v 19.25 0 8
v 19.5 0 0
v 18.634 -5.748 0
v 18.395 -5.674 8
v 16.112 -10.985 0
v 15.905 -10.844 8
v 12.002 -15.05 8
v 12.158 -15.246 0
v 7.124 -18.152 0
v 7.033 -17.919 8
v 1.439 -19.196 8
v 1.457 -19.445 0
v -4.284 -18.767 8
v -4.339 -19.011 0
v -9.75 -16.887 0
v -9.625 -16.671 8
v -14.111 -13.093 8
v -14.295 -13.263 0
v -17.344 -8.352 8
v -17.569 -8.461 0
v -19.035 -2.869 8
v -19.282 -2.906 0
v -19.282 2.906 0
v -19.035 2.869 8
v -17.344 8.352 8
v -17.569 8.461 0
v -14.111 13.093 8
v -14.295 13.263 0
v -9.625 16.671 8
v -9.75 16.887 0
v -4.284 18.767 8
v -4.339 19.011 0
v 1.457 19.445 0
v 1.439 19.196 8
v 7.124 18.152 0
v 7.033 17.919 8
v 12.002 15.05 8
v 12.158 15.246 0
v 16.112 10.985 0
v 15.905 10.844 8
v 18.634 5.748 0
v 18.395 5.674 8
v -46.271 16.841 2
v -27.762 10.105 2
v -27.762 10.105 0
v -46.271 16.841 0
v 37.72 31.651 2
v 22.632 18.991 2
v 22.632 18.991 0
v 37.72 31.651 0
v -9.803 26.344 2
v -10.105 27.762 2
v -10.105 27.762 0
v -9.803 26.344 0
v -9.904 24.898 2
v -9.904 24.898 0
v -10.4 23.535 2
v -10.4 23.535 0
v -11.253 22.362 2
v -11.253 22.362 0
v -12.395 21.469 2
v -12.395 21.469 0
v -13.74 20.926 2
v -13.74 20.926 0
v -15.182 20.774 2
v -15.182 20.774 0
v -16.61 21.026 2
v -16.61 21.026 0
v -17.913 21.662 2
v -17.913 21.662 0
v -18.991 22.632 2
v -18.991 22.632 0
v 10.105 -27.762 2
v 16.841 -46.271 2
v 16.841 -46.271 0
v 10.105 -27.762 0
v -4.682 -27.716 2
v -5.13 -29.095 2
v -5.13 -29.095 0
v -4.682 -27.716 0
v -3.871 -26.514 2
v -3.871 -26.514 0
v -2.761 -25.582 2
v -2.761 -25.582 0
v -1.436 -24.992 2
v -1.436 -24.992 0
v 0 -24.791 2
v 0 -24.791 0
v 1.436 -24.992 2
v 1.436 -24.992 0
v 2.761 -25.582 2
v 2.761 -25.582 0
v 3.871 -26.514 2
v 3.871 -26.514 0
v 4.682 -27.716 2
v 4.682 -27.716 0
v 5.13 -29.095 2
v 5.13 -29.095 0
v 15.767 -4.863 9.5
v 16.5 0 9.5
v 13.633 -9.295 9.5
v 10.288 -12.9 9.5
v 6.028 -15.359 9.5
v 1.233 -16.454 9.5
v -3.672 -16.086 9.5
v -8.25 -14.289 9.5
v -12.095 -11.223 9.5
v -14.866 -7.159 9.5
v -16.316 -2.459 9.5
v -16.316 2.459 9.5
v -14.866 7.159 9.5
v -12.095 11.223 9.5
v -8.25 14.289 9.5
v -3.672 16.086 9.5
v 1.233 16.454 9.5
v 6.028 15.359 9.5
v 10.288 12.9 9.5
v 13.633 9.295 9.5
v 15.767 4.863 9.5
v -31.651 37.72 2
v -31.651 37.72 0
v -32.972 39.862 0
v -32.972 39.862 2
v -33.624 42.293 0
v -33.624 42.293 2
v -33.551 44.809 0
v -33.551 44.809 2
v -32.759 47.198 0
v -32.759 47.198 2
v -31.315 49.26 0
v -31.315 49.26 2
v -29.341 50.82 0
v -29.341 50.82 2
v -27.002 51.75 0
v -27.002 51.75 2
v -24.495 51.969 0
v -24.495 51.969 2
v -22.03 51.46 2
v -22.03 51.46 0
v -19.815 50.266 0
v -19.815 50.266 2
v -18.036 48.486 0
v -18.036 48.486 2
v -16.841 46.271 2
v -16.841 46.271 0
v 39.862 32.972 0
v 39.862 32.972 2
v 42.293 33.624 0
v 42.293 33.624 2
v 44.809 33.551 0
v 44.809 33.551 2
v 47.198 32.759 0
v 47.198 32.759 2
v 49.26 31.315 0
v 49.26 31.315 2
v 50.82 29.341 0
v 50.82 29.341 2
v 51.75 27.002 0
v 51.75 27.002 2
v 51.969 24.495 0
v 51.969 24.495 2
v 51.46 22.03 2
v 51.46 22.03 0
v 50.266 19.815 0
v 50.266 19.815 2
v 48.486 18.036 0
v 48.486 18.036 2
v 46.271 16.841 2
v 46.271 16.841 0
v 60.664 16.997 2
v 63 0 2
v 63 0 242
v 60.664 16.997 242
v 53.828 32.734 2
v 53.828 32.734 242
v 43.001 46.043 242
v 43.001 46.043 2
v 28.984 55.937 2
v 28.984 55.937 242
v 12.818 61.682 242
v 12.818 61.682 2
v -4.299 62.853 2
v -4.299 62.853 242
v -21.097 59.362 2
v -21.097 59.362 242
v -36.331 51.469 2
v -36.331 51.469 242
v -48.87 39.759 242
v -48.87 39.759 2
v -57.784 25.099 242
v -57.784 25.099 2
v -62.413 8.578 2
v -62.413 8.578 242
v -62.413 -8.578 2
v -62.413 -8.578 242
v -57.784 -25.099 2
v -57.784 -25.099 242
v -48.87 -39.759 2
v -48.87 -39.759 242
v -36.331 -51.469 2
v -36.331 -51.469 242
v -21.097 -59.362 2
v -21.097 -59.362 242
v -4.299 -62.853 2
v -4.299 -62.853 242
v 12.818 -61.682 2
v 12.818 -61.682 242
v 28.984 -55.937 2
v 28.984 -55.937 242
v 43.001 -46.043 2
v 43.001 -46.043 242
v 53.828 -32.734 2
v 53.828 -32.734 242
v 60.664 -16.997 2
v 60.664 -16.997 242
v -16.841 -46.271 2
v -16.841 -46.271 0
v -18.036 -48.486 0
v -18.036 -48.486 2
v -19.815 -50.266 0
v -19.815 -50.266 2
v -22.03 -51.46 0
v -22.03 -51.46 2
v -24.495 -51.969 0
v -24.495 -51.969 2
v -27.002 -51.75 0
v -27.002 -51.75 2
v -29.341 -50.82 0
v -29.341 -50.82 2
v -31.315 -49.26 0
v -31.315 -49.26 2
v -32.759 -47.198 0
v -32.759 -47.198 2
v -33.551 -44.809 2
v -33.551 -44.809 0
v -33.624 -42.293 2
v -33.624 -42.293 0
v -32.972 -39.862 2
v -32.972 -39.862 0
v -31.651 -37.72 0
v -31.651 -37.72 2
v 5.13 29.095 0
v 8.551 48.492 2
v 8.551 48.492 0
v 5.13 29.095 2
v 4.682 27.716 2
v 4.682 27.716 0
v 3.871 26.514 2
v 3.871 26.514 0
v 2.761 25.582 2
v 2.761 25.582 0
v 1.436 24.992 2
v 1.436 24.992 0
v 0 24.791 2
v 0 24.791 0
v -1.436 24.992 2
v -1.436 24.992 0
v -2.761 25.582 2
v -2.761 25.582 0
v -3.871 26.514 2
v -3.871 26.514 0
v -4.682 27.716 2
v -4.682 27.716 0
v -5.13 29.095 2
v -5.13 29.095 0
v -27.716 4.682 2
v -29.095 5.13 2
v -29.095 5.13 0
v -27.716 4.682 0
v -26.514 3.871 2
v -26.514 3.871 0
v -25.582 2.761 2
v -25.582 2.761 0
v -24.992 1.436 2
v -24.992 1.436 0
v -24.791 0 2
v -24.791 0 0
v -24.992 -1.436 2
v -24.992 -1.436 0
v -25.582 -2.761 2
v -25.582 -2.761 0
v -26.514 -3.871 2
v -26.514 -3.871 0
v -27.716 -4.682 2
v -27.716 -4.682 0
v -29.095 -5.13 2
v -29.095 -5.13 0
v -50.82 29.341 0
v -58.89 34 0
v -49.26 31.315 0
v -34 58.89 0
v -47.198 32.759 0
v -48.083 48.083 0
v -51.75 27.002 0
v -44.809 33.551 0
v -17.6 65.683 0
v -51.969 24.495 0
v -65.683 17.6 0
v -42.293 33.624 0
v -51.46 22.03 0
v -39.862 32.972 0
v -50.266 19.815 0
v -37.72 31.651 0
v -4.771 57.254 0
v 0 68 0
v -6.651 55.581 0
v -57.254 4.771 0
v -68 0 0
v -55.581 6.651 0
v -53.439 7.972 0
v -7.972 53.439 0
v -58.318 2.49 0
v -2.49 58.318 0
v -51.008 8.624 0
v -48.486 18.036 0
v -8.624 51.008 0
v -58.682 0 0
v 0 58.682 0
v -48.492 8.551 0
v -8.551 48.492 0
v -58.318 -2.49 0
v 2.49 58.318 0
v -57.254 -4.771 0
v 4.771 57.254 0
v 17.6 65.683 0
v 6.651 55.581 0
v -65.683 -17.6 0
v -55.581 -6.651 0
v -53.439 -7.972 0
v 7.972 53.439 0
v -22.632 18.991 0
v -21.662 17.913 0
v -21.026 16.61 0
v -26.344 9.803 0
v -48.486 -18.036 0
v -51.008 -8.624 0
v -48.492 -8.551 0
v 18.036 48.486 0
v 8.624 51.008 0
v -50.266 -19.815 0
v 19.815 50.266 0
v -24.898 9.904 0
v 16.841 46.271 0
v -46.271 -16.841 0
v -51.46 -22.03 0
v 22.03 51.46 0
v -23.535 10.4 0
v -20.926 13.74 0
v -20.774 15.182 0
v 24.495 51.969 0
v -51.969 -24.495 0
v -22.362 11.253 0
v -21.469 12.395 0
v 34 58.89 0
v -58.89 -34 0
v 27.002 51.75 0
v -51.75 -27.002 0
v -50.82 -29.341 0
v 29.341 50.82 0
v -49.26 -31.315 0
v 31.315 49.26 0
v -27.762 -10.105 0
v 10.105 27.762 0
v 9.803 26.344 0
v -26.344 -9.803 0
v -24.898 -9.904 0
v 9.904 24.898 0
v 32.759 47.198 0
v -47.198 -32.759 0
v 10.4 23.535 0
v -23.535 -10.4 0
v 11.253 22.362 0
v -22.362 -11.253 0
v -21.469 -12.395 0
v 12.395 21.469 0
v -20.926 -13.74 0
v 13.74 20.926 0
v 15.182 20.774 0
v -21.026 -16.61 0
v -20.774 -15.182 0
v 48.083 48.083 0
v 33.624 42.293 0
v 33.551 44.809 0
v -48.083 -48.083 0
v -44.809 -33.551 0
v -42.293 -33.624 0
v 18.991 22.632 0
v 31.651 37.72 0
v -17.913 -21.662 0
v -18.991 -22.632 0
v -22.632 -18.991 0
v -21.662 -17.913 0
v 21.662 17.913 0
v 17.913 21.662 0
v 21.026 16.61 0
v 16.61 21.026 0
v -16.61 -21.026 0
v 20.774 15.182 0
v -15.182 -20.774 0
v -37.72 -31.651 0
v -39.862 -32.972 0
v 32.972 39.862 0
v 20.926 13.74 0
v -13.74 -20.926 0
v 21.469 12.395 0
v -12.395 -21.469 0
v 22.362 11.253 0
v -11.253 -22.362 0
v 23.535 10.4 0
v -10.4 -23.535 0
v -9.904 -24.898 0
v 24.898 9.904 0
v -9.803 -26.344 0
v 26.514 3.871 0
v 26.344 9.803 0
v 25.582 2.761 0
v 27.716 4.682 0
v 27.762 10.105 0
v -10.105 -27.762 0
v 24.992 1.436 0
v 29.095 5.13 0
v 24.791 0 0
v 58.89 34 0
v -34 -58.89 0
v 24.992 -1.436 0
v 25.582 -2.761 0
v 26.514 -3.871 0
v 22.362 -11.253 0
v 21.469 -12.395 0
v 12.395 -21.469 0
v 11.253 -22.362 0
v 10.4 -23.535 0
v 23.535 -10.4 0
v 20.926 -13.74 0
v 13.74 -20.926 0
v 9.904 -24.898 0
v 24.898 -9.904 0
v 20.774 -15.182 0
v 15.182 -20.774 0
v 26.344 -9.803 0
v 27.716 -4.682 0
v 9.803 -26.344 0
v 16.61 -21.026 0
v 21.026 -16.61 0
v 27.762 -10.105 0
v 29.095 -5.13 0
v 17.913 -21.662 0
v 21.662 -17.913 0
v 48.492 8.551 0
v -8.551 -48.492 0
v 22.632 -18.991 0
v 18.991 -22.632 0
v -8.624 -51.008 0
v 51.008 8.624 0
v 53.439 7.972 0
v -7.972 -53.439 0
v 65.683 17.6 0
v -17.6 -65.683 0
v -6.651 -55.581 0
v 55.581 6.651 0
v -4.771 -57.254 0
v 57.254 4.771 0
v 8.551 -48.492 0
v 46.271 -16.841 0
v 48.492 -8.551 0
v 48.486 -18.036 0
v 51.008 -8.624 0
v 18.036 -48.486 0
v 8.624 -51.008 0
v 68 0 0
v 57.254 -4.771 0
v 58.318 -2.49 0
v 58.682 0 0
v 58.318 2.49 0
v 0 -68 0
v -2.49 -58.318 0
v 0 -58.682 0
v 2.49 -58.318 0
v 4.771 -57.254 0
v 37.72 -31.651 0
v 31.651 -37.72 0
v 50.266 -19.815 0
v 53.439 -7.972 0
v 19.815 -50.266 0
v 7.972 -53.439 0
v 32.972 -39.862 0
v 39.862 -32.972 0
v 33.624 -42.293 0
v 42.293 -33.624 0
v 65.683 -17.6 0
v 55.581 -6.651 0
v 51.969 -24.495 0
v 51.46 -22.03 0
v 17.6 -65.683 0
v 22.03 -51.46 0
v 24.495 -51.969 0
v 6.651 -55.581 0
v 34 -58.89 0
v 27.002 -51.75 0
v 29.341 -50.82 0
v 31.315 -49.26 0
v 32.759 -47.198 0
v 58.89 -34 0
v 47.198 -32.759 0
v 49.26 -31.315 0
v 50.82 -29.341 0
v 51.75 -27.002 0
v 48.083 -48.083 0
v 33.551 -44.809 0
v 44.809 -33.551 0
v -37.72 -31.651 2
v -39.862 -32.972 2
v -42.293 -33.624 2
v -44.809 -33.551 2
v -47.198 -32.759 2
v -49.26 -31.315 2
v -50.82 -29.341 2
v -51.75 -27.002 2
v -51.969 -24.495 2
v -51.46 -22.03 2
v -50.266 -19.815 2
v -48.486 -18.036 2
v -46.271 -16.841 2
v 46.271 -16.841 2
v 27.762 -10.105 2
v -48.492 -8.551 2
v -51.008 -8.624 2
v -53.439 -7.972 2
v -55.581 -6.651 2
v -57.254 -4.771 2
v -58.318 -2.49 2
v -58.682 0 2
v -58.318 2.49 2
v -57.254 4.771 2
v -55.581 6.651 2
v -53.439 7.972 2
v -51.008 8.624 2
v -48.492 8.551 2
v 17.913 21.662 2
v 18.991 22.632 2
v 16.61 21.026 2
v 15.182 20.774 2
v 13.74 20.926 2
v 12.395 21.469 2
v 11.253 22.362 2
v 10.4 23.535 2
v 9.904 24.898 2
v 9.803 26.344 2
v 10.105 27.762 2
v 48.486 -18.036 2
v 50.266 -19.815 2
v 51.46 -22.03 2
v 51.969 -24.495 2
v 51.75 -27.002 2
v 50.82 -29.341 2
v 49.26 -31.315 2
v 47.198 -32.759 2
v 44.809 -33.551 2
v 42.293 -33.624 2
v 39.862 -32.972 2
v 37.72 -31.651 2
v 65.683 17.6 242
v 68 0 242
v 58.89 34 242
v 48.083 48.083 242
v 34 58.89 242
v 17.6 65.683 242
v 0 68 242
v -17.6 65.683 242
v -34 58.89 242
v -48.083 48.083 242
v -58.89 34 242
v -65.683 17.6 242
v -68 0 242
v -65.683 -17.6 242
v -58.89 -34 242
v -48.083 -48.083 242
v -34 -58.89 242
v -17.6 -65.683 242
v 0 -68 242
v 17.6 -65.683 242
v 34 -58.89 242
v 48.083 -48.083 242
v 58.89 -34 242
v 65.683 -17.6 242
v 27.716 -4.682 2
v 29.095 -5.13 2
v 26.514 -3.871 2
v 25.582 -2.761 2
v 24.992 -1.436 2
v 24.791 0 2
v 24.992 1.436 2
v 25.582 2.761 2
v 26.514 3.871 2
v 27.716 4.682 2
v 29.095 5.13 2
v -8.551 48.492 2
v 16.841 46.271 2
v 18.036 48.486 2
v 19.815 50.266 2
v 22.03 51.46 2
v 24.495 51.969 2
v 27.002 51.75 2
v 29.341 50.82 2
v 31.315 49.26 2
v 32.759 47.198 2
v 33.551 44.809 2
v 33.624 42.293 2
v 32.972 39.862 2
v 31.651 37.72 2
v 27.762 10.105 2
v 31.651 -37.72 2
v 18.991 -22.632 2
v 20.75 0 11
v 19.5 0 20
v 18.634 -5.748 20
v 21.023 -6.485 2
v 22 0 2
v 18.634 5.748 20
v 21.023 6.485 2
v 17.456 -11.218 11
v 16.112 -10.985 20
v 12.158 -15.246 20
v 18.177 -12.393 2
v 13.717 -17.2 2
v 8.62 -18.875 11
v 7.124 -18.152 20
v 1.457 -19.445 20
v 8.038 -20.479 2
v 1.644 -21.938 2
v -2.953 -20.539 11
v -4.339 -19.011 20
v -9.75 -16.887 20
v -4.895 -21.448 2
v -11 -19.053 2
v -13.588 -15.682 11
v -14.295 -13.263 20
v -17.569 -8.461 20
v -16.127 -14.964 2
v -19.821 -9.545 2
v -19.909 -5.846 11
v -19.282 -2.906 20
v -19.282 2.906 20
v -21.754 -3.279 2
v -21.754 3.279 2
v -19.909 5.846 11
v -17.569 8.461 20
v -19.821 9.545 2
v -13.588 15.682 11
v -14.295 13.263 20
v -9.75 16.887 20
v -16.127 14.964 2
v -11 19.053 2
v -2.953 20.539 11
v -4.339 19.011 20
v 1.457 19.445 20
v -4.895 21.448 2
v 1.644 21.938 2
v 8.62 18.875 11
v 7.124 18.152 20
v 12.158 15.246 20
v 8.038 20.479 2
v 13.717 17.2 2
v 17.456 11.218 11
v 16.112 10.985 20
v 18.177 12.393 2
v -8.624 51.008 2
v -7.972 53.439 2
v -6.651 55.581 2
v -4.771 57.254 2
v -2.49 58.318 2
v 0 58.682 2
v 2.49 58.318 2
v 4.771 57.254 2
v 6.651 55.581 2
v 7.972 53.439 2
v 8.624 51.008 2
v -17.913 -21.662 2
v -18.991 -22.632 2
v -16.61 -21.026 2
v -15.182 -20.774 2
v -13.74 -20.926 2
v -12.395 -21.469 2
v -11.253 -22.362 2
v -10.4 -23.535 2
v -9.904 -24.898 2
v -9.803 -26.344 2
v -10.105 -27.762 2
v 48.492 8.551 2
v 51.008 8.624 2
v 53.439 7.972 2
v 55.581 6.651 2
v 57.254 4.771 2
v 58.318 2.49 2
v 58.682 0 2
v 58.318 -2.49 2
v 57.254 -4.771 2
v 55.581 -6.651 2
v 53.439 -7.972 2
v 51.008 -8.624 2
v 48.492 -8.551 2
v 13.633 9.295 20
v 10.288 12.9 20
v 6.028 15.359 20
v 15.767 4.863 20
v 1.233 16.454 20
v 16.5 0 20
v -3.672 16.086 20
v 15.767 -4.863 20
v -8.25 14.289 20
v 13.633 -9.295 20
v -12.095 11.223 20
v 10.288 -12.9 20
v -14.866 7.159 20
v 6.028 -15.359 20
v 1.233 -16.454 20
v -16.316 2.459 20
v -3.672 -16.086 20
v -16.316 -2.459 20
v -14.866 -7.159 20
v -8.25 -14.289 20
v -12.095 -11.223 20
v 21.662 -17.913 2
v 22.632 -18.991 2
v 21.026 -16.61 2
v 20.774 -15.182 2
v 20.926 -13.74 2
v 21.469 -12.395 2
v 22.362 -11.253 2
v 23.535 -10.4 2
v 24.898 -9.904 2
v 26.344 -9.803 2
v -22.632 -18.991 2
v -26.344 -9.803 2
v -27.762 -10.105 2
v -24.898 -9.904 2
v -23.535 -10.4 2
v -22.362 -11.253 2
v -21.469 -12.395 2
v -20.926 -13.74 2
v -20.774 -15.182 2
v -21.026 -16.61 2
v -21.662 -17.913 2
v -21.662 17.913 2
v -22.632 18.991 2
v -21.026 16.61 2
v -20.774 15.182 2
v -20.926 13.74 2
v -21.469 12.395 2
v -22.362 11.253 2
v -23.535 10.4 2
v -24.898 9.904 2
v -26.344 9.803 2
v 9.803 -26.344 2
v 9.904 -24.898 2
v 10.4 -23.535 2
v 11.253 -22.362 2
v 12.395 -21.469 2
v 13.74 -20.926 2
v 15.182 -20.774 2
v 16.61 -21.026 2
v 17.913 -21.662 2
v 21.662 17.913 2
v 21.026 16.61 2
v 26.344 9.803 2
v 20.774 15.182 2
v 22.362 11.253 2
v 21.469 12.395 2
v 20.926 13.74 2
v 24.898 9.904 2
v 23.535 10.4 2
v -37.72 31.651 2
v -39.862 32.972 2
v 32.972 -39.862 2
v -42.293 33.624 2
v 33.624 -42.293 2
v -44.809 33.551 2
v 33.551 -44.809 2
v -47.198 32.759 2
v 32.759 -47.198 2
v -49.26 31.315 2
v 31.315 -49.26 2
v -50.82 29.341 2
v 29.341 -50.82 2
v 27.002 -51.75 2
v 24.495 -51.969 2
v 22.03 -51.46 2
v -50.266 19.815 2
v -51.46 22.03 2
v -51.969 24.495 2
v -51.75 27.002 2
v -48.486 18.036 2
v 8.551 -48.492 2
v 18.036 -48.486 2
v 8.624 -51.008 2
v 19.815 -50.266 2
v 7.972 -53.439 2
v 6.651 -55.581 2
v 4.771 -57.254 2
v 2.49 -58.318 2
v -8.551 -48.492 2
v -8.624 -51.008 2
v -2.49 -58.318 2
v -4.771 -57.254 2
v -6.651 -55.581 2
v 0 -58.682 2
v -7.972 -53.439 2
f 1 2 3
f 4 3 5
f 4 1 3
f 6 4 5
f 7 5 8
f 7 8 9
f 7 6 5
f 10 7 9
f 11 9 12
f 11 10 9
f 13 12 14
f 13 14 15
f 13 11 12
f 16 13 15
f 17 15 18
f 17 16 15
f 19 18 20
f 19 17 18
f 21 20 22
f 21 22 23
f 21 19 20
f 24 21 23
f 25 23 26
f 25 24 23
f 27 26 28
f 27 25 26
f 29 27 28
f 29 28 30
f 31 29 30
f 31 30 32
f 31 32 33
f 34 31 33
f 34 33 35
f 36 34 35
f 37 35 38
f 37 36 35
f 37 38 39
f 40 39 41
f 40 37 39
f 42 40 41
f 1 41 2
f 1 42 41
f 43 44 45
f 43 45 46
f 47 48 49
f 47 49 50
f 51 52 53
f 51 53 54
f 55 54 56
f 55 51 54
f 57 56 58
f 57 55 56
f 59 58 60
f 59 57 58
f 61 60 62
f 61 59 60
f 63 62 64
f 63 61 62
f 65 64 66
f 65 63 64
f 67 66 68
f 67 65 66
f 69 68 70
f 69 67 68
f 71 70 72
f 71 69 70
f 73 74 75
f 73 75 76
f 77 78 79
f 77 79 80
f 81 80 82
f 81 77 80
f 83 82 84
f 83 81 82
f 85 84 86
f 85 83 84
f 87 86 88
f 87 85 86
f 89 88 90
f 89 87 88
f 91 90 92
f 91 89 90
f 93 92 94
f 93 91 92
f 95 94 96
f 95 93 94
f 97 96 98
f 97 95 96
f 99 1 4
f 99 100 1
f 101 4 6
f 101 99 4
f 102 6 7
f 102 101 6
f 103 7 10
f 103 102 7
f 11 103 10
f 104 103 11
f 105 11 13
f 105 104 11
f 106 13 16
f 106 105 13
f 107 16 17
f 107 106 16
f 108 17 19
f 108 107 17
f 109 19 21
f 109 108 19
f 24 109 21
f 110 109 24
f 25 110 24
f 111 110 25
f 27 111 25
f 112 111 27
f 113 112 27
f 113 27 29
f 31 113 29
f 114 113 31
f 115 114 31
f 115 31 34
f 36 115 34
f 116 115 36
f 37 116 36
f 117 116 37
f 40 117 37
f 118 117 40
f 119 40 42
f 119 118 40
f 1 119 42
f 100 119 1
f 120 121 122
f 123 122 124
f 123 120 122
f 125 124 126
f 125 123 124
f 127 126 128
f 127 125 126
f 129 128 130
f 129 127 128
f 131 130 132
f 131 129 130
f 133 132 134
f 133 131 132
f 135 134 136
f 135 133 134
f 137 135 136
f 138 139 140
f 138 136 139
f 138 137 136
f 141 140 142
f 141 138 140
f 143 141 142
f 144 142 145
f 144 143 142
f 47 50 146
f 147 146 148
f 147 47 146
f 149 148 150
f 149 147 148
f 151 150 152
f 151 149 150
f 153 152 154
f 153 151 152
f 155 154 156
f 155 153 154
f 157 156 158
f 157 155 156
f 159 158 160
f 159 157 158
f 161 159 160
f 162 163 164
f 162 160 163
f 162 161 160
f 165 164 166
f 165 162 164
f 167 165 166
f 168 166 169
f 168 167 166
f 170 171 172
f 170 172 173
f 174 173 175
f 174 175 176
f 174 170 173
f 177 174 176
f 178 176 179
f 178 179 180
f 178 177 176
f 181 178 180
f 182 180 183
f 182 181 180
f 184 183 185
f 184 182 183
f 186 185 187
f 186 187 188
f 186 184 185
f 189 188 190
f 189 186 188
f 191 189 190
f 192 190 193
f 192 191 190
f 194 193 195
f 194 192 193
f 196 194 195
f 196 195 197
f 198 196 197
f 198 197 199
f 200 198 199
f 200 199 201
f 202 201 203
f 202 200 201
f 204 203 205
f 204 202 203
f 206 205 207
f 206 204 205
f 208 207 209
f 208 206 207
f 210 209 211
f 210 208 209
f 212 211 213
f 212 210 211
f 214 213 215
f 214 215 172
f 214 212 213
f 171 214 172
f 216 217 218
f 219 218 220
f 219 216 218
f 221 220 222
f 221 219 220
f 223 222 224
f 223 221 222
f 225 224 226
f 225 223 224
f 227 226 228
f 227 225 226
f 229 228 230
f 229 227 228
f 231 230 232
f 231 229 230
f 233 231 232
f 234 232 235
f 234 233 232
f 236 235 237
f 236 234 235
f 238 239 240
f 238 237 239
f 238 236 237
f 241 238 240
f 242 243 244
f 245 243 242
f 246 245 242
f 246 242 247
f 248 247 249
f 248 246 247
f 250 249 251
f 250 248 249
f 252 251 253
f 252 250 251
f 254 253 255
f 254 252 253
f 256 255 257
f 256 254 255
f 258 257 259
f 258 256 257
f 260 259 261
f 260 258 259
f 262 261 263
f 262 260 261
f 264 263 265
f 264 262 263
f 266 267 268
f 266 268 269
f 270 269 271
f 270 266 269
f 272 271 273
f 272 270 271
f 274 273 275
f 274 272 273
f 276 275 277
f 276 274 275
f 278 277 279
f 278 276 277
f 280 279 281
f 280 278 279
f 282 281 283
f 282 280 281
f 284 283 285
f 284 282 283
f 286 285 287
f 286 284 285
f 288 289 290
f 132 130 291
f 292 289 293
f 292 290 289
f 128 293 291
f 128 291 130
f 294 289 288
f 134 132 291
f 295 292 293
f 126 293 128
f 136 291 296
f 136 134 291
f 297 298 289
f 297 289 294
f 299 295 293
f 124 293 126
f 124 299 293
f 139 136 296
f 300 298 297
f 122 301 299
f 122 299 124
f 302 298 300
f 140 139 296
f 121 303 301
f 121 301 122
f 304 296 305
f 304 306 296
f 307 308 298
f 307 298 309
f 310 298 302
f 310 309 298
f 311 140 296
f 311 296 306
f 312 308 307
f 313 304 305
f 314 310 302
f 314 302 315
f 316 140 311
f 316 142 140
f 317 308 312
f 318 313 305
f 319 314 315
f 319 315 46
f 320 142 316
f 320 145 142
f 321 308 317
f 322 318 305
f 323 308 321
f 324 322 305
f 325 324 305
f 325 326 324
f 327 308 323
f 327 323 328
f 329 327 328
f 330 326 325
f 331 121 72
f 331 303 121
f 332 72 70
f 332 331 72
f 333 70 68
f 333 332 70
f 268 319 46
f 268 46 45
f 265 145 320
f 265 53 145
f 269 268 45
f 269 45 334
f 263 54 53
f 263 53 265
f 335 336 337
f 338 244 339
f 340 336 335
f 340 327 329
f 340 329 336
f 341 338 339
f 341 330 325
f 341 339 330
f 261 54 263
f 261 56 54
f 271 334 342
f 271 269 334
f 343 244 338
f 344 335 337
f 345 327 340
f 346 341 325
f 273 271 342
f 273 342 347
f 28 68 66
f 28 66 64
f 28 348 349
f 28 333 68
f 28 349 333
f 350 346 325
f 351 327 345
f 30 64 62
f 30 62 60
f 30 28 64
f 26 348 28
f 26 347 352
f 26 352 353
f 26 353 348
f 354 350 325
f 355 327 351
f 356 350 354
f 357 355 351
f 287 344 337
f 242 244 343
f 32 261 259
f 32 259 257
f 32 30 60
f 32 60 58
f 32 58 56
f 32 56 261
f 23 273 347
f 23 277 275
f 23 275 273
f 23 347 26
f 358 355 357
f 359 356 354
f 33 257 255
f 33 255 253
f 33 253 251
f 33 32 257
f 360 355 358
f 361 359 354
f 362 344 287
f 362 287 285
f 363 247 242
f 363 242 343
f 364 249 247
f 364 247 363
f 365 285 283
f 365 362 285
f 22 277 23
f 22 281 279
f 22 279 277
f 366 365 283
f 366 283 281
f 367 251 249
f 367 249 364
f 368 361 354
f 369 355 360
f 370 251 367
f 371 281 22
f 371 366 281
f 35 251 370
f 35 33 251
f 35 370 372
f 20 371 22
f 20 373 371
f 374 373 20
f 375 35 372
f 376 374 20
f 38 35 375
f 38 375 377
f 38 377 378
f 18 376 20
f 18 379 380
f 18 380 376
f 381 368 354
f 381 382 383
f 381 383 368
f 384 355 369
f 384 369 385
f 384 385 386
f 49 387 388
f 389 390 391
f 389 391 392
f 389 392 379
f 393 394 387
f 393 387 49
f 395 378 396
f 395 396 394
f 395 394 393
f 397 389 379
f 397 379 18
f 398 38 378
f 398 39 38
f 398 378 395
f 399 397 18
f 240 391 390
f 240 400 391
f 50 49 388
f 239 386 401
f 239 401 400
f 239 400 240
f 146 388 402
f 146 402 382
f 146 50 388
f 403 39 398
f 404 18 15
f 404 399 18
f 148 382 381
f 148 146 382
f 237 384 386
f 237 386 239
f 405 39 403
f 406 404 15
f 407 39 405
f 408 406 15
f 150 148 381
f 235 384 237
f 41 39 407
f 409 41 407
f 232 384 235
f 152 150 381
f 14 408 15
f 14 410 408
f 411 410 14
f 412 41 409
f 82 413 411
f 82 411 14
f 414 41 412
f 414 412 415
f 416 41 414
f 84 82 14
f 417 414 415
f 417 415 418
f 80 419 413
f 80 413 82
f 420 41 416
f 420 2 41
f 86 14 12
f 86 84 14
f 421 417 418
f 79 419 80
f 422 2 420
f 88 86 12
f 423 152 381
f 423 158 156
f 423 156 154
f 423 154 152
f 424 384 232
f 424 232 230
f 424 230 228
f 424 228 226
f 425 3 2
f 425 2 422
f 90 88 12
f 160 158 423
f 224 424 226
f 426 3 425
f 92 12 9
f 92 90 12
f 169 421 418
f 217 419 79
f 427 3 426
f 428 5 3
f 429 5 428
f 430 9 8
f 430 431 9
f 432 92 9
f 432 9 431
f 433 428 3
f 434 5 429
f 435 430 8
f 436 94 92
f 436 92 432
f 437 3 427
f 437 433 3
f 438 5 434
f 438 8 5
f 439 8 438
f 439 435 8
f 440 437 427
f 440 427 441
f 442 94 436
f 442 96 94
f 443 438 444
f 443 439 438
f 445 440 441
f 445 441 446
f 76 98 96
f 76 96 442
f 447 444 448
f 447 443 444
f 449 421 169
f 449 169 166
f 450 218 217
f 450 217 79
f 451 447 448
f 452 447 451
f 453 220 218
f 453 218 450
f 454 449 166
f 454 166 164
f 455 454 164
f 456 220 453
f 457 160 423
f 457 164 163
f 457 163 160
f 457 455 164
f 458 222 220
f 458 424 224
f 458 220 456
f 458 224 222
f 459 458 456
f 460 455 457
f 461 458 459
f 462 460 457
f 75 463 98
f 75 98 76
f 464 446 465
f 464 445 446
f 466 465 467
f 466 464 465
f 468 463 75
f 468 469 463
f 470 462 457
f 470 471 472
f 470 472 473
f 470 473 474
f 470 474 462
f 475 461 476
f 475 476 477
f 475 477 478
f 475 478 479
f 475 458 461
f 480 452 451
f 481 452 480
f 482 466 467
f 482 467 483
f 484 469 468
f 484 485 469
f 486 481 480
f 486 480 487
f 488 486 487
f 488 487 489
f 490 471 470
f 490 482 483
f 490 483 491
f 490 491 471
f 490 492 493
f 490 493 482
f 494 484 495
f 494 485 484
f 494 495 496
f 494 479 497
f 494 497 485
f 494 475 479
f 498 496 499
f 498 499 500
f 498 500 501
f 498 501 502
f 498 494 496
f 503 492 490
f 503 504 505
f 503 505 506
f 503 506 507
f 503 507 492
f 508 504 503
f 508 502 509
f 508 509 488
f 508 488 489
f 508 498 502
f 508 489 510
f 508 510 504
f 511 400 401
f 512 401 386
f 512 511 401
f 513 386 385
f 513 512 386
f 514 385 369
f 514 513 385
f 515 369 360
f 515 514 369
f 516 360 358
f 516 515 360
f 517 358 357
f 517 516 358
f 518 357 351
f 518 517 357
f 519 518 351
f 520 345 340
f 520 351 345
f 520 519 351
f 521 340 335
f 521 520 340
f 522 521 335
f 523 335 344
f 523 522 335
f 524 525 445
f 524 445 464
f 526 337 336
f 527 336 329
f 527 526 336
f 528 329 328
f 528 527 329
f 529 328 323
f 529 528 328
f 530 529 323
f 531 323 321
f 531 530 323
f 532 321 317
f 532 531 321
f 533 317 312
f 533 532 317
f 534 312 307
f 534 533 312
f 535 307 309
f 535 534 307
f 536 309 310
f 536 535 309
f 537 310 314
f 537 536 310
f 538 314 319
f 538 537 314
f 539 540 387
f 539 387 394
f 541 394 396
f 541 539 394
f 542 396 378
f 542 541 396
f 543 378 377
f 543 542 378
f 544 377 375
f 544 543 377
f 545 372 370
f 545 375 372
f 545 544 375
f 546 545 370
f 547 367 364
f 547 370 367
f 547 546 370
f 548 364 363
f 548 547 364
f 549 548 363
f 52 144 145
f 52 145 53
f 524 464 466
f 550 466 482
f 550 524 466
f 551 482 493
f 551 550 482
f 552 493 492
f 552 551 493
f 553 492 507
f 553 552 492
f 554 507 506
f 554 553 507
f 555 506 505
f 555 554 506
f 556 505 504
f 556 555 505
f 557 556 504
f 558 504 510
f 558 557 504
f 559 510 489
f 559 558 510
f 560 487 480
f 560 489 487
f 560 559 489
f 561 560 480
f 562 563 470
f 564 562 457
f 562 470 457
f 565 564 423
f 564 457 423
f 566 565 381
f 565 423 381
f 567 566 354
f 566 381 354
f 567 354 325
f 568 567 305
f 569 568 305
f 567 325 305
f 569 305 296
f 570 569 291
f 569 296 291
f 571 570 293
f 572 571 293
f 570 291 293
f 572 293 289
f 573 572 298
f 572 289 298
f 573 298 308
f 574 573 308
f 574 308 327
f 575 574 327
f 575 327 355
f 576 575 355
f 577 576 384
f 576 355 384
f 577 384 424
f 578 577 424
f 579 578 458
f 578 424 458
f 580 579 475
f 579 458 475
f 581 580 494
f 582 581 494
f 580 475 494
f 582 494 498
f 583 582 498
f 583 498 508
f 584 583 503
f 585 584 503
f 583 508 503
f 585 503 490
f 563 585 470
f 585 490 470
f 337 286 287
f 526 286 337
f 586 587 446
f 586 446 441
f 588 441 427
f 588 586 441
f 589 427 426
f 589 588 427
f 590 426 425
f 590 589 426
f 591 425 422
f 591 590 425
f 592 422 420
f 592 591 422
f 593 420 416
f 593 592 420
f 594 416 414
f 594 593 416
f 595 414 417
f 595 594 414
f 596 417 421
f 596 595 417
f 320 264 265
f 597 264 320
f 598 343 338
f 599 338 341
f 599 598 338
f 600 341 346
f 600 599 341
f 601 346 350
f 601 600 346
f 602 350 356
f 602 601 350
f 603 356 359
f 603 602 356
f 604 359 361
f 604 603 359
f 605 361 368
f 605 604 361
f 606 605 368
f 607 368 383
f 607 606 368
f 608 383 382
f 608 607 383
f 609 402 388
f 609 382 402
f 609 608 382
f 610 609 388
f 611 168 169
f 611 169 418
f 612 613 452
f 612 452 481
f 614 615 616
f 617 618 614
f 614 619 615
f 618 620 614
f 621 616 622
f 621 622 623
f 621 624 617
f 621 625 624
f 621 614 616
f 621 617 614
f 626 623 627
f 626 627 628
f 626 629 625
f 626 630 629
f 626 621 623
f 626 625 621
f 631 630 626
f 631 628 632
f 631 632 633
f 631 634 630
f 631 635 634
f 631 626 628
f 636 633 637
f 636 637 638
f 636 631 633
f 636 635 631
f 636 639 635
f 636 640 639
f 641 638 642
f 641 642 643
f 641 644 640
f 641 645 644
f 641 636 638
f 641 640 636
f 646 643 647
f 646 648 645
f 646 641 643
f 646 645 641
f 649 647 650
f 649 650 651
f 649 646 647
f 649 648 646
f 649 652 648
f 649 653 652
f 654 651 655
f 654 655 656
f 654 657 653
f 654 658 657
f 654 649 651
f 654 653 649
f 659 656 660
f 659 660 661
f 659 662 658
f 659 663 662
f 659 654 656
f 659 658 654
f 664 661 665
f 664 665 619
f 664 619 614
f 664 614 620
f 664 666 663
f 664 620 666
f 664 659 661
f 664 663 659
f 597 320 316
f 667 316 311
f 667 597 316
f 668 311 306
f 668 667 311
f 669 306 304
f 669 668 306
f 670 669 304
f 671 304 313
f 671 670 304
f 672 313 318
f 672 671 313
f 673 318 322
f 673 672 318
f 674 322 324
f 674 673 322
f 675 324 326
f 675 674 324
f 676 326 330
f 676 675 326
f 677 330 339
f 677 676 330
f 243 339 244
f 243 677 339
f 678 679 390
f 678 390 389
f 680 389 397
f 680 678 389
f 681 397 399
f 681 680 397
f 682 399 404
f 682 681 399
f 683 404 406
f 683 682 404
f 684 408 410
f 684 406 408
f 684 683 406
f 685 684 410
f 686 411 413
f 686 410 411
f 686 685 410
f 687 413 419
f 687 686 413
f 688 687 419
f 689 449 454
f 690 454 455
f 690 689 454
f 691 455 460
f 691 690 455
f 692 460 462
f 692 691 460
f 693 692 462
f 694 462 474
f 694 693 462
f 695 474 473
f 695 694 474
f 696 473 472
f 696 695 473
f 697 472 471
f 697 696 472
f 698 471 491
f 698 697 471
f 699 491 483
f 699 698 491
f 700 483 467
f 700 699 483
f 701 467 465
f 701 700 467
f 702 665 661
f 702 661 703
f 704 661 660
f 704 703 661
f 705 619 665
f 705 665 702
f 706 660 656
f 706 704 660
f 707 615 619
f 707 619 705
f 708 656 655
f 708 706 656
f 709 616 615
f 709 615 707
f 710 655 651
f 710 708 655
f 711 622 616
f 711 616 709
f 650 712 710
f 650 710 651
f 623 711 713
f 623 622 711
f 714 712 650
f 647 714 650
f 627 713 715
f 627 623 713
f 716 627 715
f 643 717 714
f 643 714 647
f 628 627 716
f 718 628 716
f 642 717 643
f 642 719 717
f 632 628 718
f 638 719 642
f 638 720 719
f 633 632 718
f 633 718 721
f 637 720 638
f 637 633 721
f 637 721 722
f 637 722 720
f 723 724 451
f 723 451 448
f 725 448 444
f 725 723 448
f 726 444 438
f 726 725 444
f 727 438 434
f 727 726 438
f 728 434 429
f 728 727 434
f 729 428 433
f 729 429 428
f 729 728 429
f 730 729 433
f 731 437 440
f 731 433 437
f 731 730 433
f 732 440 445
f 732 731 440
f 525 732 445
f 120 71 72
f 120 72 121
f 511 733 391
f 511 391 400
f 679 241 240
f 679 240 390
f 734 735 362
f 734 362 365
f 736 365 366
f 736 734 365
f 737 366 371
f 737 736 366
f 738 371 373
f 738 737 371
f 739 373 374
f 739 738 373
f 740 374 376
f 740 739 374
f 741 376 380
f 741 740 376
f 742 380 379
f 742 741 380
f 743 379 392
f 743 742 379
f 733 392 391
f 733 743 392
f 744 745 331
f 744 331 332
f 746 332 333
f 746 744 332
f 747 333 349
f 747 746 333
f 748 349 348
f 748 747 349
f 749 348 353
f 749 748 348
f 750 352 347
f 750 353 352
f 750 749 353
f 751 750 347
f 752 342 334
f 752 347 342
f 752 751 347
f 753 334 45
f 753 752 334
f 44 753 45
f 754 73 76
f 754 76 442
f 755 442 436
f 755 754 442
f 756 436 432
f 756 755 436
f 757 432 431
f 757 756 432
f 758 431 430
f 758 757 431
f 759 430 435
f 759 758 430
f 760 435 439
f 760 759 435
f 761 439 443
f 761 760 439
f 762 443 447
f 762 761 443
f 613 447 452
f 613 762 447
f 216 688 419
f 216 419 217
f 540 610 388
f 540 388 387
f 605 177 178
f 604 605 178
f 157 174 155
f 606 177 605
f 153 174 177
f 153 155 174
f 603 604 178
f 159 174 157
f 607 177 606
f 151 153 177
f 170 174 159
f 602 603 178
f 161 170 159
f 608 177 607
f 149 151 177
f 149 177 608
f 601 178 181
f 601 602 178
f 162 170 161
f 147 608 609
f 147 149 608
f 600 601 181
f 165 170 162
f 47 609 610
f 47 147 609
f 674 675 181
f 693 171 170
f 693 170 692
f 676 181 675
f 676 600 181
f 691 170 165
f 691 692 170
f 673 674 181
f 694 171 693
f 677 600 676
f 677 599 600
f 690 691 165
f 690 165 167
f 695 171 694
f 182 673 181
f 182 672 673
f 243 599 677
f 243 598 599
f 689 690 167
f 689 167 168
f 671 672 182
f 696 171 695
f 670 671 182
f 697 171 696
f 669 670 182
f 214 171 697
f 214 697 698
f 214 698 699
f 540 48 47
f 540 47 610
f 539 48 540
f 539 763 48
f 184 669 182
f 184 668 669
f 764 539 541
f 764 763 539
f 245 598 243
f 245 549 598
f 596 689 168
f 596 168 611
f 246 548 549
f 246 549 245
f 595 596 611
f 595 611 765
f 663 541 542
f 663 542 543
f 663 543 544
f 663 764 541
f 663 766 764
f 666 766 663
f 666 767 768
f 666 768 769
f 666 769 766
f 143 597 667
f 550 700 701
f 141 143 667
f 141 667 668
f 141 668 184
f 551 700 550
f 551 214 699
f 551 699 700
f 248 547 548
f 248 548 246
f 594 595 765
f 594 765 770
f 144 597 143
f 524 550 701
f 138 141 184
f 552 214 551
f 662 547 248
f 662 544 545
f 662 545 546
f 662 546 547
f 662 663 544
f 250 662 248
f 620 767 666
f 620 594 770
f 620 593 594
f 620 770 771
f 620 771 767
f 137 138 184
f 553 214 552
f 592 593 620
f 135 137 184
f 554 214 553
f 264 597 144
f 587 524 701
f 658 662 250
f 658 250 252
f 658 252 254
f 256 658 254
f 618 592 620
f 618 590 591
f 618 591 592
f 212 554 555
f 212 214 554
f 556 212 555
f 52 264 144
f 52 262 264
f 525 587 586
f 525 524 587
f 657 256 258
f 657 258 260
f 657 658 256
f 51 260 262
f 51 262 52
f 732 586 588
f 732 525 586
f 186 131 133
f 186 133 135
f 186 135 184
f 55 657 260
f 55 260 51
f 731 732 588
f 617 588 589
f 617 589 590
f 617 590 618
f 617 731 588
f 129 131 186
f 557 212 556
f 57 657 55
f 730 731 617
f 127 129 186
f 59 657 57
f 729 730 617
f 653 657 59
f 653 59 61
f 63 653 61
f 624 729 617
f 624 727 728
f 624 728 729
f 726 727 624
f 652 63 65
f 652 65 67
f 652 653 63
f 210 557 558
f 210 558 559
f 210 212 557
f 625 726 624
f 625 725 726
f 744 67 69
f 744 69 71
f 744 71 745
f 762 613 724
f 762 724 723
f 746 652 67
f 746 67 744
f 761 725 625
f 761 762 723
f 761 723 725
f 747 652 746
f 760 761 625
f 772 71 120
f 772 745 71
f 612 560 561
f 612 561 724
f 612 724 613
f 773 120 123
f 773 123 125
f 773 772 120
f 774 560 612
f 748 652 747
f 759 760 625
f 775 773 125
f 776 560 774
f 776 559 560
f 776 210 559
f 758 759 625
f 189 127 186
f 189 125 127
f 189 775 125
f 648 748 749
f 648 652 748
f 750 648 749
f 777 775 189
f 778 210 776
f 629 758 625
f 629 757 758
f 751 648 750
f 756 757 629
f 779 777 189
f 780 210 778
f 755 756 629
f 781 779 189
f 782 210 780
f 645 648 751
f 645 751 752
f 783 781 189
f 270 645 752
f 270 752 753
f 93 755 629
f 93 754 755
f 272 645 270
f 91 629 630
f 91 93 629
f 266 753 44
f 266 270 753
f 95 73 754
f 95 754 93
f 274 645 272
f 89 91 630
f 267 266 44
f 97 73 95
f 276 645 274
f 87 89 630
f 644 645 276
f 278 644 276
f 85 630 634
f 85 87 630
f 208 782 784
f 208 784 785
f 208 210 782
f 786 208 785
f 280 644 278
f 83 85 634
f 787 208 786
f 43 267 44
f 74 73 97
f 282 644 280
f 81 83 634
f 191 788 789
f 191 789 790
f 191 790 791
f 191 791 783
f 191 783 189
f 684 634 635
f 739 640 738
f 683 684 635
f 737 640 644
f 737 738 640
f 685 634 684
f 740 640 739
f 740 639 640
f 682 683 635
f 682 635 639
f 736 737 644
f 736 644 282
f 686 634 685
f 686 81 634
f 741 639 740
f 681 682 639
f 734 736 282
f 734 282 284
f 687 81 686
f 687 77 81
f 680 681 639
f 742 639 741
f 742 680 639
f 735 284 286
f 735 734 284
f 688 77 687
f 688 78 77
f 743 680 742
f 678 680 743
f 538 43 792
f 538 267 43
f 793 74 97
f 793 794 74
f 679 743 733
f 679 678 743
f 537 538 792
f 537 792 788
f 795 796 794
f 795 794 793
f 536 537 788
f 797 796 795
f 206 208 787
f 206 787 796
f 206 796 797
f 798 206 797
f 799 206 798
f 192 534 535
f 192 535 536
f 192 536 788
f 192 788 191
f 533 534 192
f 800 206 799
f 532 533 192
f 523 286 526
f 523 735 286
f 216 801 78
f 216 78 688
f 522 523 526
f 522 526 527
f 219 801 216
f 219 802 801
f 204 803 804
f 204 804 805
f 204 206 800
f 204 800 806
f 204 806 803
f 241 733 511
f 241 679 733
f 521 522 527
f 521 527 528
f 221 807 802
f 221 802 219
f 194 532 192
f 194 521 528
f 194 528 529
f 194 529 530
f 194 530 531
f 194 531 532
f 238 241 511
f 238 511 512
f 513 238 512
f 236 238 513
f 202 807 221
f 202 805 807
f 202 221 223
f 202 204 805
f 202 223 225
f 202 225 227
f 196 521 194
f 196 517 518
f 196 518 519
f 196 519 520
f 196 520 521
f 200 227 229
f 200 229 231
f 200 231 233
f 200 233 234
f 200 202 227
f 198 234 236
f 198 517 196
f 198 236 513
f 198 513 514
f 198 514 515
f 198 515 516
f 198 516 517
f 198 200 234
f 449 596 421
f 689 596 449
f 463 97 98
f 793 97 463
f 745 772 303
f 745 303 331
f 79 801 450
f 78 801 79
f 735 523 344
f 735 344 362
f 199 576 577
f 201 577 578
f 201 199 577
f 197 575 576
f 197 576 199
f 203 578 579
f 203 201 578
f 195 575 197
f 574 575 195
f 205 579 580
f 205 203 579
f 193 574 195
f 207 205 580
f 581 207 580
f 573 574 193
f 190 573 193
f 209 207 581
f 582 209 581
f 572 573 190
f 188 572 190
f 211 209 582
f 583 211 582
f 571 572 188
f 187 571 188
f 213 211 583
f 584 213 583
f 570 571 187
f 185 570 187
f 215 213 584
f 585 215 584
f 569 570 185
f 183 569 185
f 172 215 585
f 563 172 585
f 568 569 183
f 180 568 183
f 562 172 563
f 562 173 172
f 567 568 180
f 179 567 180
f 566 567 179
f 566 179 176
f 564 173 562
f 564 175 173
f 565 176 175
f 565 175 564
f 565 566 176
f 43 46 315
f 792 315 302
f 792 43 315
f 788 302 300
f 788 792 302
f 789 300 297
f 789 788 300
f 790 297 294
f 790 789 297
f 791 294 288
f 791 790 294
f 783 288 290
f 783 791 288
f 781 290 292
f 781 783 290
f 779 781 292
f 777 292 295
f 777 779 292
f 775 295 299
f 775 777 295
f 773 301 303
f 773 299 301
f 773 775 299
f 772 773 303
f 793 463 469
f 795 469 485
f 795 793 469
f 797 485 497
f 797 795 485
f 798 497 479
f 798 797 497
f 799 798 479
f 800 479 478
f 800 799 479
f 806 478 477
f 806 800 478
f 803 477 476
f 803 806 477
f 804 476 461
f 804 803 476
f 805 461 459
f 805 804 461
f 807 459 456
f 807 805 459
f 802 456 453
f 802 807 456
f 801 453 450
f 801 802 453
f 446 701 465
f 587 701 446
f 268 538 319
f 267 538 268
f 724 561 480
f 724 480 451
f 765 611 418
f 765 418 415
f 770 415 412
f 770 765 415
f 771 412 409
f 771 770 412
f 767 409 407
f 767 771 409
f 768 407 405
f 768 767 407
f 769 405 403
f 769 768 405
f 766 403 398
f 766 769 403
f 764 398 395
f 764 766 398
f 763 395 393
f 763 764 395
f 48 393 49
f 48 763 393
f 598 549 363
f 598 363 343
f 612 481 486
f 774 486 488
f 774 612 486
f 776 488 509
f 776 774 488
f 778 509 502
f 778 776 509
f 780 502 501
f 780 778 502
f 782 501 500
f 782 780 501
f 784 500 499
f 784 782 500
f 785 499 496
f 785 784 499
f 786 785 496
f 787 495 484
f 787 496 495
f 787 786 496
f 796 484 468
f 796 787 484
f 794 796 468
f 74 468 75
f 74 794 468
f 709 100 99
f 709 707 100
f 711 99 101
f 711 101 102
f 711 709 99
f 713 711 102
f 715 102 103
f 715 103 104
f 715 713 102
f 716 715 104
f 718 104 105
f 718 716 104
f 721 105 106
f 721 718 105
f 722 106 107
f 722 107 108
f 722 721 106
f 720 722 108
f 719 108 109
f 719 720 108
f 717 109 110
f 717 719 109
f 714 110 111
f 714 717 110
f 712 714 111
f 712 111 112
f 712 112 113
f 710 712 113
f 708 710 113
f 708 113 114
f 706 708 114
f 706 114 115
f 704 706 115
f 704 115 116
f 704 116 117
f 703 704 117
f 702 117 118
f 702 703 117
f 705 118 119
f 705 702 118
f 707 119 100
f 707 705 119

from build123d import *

# Parameters (mm, degrees)
RING_1MM_R          = 68
RING_1MM_R_2        = 63
BOSS_EXTRUDE1_DEPTH = 240
CUT_EXTRUDE2_DEPTH  = 240


with BuildPart() as part:
    # Sketch1 → Revolve1 (revolve)
    with BuildSketch(Plane(origin=(0, 0, 0), x_dir=(-1, 0, 0), z_dir=(0, 1, 0)), mode=Mode.PRIVATE) as revolve1_sk:
        Polygon((19.5, 0), (19.25, 8), (16.5, 9.5), (16.5, 20), (19.5, 20), (22, 2), (68, 2), (68, 0), align=None)
    revolve(revolve1_sk.sketch.rotate(Axis((0, 0, 20), (0, 0, -1)), 180), axis=Axis((0, 0, 20), (0, 0, -1)))

    # ring-1mm → Boss-Extrude1 (add)
    with BuildSketch(Plane.XY.offset(2)):
        Circle(RING_1MM_R)
        Circle(RING_1MM_R_2, mode=Mode.SUBTRACT)
    extrude(amount=BOSS_EXTRUDE1_DEPTH)

    # Sketch3-base-openings → Cut-Extrude2 (cut)
    with BuildSketch(Plane.XY.offset(2)):
        with BuildLine():
            Line((29.095389312, 5.13030215), (48.49231552, 8.550503583))
            ThreePointArc((48.49231552, 8.550503583), (58.682408883, 0), (48.49231552, -8.550503583))
            Line((48.49231552, -8.550503583), (29.095389312, -5.13030215))
            ThreePointArc((29.095389312, -5.13030215), (24.79055467, 0), (29.095389312, 5.13030215))
        make_face()
        with BuildLine():
            Line((27.762497352, -10.104722665), (46.27082892, -16.841204442))
            ThreePointArc((46.27082892, -16.841204442), (50.820456848, -29.341204442), (37.720325337, -31.651111078))
            Line((37.720325337, -31.651111078), (22.632195202, -18.990666647))
            ThreePointArc((22.632195202, -18.990666647), (21.469250118, -12.395277335), (27.762497352, -10.104722665))
        make_face()
        with BuildLine():
            Line((18.990666647, -22.632195202), (31.651111078, -37.720325337))
            ThreePointArc((31.651111078, -37.720325337), (29.341204442, -50.820456848), (16.841204442, -46.27082892))
            Line((16.841204442, -46.27082892), (10.104722665, -27.762497352))
            ThreePointArc((10.104722665, -27.762497352), (12.395277335, -21.469250118), (18.990666647, -22.632195202))
        make_face()
        with BuildLine():
            Line((5.13030215, -29.095389312), (8.550503583, -48.49231552))
            ThreePointArc((8.550503583, -48.49231552), (0, -58.682408883), (-8.550503583, -48.49231552))
            Line((-8.550503583, -48.49231552), (-5.13030215, -29.095389312))
            ThreePointArc((-5.13030215, -29.095389312), (0, -24.79055467), (5.13030215, -29.095389312))
        make_face()
        with BuildLine():
            Line((-10.104722665, -27.762497352), (-16.841204442, -46.27082892))
            ThreePointArc((-16.841204442, -46.27082892), (-29.341204442, -50.820456848), (-31.651111078, -37.720325337))
            Line((-31.651111078, -37.720325337), (-18.990666647, -22.632195202))
            ThreePointArc((-18.990666647, -22.632195202), (-12.395277335, -21.469250118), (-10.104722665, -27.762497352))
        make_face()
        with BuildLine():
            Line((-22.632195202, -18.990666647), (-37.720325337, -31.651111078))
            ThreePointArc((-37.720325337, -31.651111078), (-50.820456848, -29.341204442), (-46.27082892, -16.841204442))
            Line((-46.27082892, -16.841204442), (-27.762497352, -10.104722665))
            ThreePointArc((-27.762497352, -10.104722665), (-21.469250118, -12.395277335), (-22.632195202, -18.990666647))
        make_face()
        with BuildLine():
            Line((-29.095389312, -5.13030215), (-48.49231552, -8.550503583))
            ThreePointArc((-48.49231552, -8.550503583), (-58.682408883, 0), (-48.49231552, 8.550503583))
            Line((-48.49231552, 8.550503583), (-29.095389312, 5.13030215))
            ThreePointArc((-29.095389312, 5.13030215), (-24.79055467, 0), (-29.095389312, -5.13030215))
        make_face()
        with BuildLine():
            Line((-27.762497352, 10.104722665), (-46.27082892, 16.841204442))
            ThreePointArc((-46.27082892, 16.841204442), (-50.820456848, 29.341204442), (-37.720325337, 31.651111078))
            Line((-37.720325337, 31.651111078), (-22.632195202, 18.990666647))
            ThreePointArc((-22.632195202, 18.990666647), (-21.469250118, 12.395277335), (-27.762497352, 10.104722665))
        make_face()
        with BuildLine():
            Line((-18.990666647, 22.632195202), (-31.651111078, 37.720325337))
            ThreePointArc((-31.651111078, 37.720325337), (-29.341204442, 50.820456848), (-16.841204442, 46.27082892))
            Line((-16.841204442, 46.27082892), (-10.104722665, 27.762497352))
            ThreePointArc((-10.104722665, 27.762497352), (-12.395277335, 21.469250118), (-18.990666647, 22.632195202))
        make_face()
        with BuildLine():
            Line((-5.13030215, 29.095389312), (-8.550503583, 48.49231552))
            ThreePointArc((-8.550503583, 48.49231552), (0, 58.682408883), (8.550503583, 48.49231552))
            Line((8.550503583, 48.49231552), (5.13030215, 29.095389312))
            ThreePointArc((5.13030215, 29.095389312), (0, 24.79055467), (-5.13030215, 29.095389312))
        make_face()
        with BuildLine():
            Line((10.104722665, 27.762497352), (16.841204442, 46.27082892))
            ThreePointArc((16.841204442, 46.27082892), (29.341204442, 50.820456848), (31.651111078, 37.720325337))
            Line((31.651111078, 37.720325337), (18.990666647, 22.632195202))
            ThreePointArc((18.990666647, 22.632195202), (12.395277335, 21.469250118), (10.104722665, 27.762497352))
        make_face()
        with BuildLine():
            Line((22.632195202, 18.990666647), (37.720325337, 31.651111078))
            ThreePointArc((37.720325337, 31.651111078), (50.820456848, 29.341204442), (46.27082892, 16.841204442))
            Line((46.27082892, 16.841204442), (27.762497352, 10.104722665))
            ThreePointArc((27.762497352, 10.104722665), (21.469250118, 12.395277335), (22.632195202, 18.990666647))
        make_face()
    extrude(amount=-CUT_EXTRUDE2_DEPTH, mode=Mode.SUBTRACT)


solid = part.part
